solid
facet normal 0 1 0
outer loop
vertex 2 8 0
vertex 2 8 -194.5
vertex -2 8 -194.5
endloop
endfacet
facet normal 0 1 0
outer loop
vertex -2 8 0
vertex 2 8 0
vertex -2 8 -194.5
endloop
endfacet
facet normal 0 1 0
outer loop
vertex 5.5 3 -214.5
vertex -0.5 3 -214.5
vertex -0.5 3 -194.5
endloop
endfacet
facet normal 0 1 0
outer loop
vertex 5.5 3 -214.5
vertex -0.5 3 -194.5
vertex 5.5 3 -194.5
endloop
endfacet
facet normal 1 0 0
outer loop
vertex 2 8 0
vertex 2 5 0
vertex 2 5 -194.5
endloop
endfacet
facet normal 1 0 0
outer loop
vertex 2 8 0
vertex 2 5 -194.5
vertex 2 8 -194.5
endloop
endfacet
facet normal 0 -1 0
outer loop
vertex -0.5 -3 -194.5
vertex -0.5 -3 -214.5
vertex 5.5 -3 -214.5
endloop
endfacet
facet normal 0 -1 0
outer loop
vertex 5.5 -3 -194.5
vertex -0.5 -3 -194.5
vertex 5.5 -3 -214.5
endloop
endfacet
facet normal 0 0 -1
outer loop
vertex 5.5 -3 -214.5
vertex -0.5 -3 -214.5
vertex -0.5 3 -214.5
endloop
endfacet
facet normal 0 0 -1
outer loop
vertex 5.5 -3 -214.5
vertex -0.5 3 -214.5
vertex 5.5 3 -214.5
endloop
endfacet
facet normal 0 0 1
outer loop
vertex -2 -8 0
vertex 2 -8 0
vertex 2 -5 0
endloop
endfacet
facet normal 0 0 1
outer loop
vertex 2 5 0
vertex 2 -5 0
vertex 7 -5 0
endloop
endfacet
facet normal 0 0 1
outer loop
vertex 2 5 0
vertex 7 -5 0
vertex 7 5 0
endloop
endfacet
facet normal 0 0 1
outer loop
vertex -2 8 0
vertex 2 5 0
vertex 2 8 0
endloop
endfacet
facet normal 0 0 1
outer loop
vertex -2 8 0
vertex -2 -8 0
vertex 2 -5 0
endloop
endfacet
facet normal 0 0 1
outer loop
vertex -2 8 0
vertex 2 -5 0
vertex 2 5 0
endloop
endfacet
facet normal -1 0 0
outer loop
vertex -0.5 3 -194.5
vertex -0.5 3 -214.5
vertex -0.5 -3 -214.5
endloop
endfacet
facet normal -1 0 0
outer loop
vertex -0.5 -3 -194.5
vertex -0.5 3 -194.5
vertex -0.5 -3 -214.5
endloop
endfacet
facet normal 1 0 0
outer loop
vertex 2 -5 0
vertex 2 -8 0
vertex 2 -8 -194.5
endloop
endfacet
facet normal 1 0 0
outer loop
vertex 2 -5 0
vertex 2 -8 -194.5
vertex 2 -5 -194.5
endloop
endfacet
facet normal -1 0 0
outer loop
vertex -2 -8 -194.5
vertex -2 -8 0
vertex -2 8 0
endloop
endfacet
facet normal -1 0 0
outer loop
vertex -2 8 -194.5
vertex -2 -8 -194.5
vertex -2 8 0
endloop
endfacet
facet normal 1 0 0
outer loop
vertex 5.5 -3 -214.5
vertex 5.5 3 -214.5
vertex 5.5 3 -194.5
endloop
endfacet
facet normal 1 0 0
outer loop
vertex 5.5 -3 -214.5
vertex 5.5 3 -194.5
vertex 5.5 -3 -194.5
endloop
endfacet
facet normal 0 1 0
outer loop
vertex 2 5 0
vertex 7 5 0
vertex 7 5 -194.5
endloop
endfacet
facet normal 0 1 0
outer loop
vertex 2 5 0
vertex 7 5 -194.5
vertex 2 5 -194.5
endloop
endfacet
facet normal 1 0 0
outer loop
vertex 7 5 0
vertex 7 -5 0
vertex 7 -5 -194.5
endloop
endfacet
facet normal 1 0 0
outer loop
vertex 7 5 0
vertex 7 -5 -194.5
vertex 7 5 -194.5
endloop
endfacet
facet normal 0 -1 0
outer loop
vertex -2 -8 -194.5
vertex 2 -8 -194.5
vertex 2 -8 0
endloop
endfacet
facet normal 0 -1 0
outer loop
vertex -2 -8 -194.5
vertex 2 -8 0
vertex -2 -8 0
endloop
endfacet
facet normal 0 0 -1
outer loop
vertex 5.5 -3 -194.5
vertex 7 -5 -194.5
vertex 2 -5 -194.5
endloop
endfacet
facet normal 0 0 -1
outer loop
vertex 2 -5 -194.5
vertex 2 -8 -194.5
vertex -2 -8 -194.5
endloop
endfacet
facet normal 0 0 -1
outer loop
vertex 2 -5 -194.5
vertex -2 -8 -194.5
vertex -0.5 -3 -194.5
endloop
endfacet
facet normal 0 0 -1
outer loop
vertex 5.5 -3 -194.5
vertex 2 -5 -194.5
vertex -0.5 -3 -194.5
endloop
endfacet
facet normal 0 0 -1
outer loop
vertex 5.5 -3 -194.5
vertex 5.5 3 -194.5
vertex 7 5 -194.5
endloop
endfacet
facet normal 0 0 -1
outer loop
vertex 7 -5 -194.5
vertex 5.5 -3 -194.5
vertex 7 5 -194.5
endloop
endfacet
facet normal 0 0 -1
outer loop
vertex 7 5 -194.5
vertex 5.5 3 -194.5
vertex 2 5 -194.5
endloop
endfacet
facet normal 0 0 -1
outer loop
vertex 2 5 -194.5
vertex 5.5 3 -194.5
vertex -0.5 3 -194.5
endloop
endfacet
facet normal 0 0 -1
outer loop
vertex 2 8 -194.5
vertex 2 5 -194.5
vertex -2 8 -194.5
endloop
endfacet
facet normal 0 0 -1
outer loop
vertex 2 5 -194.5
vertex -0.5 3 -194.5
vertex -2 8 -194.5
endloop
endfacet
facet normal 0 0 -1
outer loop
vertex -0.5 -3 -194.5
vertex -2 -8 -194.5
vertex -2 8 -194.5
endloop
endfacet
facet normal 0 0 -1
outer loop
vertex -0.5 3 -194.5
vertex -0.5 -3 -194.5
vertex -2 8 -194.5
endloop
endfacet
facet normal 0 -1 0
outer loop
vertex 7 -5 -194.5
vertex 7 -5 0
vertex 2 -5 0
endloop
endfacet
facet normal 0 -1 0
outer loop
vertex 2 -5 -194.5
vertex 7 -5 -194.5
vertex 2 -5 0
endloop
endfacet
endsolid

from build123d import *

# Parameters (mm, degrees)
SKETCH1_W           = 10
SKETCH1_H           = 5
SKETCH1_W_2         = 16
SKETCH1_H_2         = 4
BOSS_EXTRUDE1_DEPTH = 194.5
SKETCH2_W           = 6
SKETCH2_H           = 6
BOSS_EXTRUDE2_DEPTH = 20


with BuildPart() as part:
    # Sketch1 → Boss-Extrude1 (new body)
    with BuildSketch(Plane(origin=(0, 0, 0), x_dir=(0, 1, 0), z_dir=(0, 0, 1))):
        with Locations((0, -4.5)):
            Rectangle(SKETCH1_W, SKETCH1_H)
        Rectangle(SKETCH1_W_2, SKETCH1_H_2)
    extrude(amount=-BOSS_EXTRUDE1_DEPTH)

    # Sketch2 → Boss-Extrude2 (add)
    with BuildSketch(Plane(origin=(0, 0, -194.5), x_dir=(1, 0, 0), z_dir=(0, 0, -1))):
        with Locations((2.5, 0)):
            Rectangle(SKETCH2_W, SKETCH2_H)
    extrude(amount=BOSS_EXTRUDE2_DEPTH)


solid = part.part
